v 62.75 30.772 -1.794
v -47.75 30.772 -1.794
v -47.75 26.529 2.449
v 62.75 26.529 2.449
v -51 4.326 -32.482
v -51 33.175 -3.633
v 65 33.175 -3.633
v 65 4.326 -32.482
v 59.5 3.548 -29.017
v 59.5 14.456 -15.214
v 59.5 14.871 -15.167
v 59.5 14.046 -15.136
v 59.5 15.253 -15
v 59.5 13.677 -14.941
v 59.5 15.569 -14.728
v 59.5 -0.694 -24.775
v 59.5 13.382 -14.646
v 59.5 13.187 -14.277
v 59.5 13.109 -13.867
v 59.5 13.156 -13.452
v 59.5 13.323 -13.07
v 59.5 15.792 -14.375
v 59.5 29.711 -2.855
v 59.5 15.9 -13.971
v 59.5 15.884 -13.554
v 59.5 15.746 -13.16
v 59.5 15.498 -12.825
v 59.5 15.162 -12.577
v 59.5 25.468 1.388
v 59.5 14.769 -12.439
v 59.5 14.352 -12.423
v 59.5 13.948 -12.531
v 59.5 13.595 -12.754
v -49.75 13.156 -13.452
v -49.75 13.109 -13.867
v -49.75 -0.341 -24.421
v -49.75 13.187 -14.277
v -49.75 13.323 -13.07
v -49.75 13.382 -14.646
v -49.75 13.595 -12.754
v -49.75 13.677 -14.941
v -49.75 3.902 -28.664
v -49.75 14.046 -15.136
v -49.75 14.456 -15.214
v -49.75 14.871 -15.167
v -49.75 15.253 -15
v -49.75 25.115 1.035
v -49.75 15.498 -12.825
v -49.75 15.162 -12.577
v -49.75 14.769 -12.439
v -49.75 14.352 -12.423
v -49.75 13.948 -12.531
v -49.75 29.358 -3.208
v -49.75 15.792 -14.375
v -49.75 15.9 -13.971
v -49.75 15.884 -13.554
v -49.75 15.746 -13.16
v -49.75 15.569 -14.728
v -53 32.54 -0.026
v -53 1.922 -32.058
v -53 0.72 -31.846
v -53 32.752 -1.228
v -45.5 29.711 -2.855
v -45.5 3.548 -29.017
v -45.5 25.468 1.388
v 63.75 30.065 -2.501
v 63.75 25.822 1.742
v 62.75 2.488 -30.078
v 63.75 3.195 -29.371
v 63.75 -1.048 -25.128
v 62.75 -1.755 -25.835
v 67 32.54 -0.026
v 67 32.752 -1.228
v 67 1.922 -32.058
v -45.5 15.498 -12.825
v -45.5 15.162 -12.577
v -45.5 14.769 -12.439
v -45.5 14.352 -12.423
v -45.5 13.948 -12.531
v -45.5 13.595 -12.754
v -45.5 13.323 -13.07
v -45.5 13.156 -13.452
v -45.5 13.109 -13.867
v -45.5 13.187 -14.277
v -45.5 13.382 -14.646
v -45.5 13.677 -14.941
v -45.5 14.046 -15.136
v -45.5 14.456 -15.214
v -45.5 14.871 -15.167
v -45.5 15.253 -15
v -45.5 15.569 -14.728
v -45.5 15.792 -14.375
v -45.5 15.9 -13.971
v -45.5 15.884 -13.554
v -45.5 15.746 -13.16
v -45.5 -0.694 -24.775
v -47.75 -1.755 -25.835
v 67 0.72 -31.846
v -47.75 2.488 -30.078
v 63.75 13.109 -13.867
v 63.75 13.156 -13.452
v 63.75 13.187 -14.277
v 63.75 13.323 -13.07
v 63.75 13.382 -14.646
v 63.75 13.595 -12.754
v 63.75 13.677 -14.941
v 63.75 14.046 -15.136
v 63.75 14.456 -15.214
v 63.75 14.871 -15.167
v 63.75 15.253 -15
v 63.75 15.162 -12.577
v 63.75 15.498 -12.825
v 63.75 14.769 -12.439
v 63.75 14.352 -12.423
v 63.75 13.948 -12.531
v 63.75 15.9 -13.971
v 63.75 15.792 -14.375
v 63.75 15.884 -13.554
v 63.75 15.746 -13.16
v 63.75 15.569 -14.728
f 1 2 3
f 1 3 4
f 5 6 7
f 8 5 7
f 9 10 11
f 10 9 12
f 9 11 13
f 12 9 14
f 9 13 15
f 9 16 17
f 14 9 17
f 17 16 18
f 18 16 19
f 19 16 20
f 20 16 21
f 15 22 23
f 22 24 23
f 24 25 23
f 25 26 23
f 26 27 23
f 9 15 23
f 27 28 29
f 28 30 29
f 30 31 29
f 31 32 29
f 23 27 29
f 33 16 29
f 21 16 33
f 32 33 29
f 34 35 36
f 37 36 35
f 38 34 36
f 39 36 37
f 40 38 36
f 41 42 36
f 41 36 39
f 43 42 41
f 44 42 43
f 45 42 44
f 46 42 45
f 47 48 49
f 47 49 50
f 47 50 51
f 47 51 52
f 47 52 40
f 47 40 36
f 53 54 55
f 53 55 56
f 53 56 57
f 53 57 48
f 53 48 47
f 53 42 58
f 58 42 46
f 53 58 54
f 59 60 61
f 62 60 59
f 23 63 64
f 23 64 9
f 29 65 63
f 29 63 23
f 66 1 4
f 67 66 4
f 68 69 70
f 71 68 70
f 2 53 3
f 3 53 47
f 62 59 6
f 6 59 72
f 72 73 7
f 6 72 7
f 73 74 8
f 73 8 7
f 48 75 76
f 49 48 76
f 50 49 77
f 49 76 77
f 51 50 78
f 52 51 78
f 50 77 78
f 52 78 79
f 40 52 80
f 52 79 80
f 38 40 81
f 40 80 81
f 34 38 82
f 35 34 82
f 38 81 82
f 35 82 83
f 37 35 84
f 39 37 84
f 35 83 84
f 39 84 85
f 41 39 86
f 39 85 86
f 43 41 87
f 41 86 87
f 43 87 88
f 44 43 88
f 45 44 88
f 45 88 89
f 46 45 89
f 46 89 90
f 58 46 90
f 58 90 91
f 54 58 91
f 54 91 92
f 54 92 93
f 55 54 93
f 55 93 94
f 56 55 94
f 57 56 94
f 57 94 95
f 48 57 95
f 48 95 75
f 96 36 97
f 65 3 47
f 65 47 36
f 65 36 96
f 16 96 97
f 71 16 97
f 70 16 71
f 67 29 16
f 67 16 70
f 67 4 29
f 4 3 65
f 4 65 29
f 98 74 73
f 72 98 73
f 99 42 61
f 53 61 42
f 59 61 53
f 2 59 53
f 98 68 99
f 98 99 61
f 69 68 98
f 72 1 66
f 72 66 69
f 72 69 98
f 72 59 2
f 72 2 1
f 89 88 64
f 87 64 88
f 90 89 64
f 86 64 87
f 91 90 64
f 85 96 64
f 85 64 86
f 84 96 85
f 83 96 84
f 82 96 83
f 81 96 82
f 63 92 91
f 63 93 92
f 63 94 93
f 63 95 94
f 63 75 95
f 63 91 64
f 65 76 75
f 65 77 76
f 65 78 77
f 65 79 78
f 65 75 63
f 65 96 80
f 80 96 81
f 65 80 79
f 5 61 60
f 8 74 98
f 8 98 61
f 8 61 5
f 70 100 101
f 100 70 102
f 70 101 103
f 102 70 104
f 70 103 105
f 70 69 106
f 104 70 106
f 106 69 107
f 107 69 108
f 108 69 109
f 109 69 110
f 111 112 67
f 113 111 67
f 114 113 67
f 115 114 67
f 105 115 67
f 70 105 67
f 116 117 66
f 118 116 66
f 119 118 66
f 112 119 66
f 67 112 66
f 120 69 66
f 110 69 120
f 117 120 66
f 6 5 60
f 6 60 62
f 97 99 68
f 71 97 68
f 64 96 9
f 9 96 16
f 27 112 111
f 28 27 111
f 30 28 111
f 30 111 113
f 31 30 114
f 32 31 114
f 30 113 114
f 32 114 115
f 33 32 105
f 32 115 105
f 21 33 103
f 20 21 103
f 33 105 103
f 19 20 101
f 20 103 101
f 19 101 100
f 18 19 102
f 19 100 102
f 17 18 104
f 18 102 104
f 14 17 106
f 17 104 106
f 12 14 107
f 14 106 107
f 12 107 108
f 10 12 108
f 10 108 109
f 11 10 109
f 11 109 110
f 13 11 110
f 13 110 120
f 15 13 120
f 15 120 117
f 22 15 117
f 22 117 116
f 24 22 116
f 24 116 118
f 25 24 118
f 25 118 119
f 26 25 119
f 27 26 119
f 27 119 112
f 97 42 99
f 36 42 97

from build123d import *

# Parameters (mm, degrees)
SKETCH018_W             = 120
SKETCH018_H             = 45
PAD003_DEPTH            = 3
SKETCH019_W             = 113.5
SKETCH019_H             = 40
PAD004_DEPTH            = 6
SKETCH020_R             = 1.4
POCKET008_DEPTH         = 116.751
POCKET012_DEPTH         = 376.9523572644
CHAMFER008_SIZE         = 2
SKETCH021_W             = 105
SKETCH021_H             = 37
POCKET013_DEPTH         = 6
CHAMFER009_SIZE         = 2
CHAMFER010_SIZE         = 1
CHAMFER011_SIZE         = 1
CHAMFER012_SIZE         = 2
BODY001_PLACEMENT_ANGLE = 45


with BuildPart() as part:
    # Sketch018 → Pad003 (new body)
    with BuildSketch(Plane.XZ):
        Rectangle(SKETCH018_W, SKETCH018_H)
    extrude(amount=PAD003_DEPTH)

    # Sketch019 (on Face6 of Pad003) → Pad004 (join)
    with BuildSketch(Plane.XZ.offset(3)):
        Rectangle(SKETCH019_W, SKETCH019_H)
    extrude(amount=PAD004_DEPTH)

    # Sketch020 (on Face8 of Pad004) → Pocket008 (cut, through all)
    with BuildSketch(Plane(origin=(56.75, 0, 0), x_dir=(0, 0, 1), z_dir=(1, 0, 0))):
        with Locations((0, 6)):
            Circle(SKETCH020_R)
    extrude(amount=-POCKET008_DEPTH, mode=Mode.SUBTRACT)

    # Sketch024 (on Face3 of Pocket008) → Pocket012 (cut, through all)
    with BuildSketch(Plane(origin=(60, 0, 0), x_dir=(0, 0, 1), z_dir=(1, 0, 0))):
        Polygon((-22.5, 3), (-17.8754562378, -3.604532956), (-35.516254, -3.604532956), align=None)
    pocket012 = extrude(amount=-POCKET012_DEPTH, mode=Mode.SUBTRACT)

    # Mirrored: Pocket012 across Sketch024 V_Axis
    add(pocket012.mirror(Plane(origin=(60, 0, 0), x_dir=(1, 0, 0), z_dir=(0, 0, 1))), mode=Mode.SUBTRACT)

    # Chamfer008
    chamfer008_edges = [part.edges().sort_by_distance(p)[0] for p in [
        (60, 0, 0),
        (-60, 0, 0),
    ]]
    chamfer(chamfer008_edges, length=CHAMFER008_SIZE)

    # Sketch021 → Pocket013 (cut)
    with BuildSketch(Plane.XZ.offset(9)):
        Rectangle(SKETCH021_W, SKETCH021_H)
    extrude(amount=-POCKET013_DEPTH, mode=Mode.SUBTRACT)

    # Chamfer009
    chamfer009_edges = [part.edges().sort_by_distance(p)[0] for p in [
        (-56.75, -6, -20),
    ]]
    chamfer(chamfer009_edges, length=CHAMFER009_SIZE)

    # Chamfer010
    chamfer010_edges = [part.edges().sort_by_distance(p)[0] for p in [
        (56.75, -6, -20),
    ]]
    chamfer(chamfer010_edges, length=CHAMFER010_SIZE)

    # Chamfer011
    chamfer011_edges = [part.edges().sort_by_distance(p)[0] for p in [
        (56.75, -6, 20),
    ]]
    chamfer(chamfer011_edges, length=CHAMFER011_SIZE)

    # Chamfer012
    chamfer012_edges = [part.edges().sort_by_distance(p)[0] for p in [
        (-56.75, -6, 20),
    ]]
    chamfer(chamfer012_edges, length=CHAMFER012_SIZE)


with BuildPart() as part_1:
    # Body001 placement: moved
    add(part.part.moved(Location((7, 18.7509559904, -18.0573149459))).rotate(Axis((7, 18.7509559904, -18.0573149459), (-1, 0, 0)), BODY001_PLACEMENT_ANGLE))


solid = part_1.part
